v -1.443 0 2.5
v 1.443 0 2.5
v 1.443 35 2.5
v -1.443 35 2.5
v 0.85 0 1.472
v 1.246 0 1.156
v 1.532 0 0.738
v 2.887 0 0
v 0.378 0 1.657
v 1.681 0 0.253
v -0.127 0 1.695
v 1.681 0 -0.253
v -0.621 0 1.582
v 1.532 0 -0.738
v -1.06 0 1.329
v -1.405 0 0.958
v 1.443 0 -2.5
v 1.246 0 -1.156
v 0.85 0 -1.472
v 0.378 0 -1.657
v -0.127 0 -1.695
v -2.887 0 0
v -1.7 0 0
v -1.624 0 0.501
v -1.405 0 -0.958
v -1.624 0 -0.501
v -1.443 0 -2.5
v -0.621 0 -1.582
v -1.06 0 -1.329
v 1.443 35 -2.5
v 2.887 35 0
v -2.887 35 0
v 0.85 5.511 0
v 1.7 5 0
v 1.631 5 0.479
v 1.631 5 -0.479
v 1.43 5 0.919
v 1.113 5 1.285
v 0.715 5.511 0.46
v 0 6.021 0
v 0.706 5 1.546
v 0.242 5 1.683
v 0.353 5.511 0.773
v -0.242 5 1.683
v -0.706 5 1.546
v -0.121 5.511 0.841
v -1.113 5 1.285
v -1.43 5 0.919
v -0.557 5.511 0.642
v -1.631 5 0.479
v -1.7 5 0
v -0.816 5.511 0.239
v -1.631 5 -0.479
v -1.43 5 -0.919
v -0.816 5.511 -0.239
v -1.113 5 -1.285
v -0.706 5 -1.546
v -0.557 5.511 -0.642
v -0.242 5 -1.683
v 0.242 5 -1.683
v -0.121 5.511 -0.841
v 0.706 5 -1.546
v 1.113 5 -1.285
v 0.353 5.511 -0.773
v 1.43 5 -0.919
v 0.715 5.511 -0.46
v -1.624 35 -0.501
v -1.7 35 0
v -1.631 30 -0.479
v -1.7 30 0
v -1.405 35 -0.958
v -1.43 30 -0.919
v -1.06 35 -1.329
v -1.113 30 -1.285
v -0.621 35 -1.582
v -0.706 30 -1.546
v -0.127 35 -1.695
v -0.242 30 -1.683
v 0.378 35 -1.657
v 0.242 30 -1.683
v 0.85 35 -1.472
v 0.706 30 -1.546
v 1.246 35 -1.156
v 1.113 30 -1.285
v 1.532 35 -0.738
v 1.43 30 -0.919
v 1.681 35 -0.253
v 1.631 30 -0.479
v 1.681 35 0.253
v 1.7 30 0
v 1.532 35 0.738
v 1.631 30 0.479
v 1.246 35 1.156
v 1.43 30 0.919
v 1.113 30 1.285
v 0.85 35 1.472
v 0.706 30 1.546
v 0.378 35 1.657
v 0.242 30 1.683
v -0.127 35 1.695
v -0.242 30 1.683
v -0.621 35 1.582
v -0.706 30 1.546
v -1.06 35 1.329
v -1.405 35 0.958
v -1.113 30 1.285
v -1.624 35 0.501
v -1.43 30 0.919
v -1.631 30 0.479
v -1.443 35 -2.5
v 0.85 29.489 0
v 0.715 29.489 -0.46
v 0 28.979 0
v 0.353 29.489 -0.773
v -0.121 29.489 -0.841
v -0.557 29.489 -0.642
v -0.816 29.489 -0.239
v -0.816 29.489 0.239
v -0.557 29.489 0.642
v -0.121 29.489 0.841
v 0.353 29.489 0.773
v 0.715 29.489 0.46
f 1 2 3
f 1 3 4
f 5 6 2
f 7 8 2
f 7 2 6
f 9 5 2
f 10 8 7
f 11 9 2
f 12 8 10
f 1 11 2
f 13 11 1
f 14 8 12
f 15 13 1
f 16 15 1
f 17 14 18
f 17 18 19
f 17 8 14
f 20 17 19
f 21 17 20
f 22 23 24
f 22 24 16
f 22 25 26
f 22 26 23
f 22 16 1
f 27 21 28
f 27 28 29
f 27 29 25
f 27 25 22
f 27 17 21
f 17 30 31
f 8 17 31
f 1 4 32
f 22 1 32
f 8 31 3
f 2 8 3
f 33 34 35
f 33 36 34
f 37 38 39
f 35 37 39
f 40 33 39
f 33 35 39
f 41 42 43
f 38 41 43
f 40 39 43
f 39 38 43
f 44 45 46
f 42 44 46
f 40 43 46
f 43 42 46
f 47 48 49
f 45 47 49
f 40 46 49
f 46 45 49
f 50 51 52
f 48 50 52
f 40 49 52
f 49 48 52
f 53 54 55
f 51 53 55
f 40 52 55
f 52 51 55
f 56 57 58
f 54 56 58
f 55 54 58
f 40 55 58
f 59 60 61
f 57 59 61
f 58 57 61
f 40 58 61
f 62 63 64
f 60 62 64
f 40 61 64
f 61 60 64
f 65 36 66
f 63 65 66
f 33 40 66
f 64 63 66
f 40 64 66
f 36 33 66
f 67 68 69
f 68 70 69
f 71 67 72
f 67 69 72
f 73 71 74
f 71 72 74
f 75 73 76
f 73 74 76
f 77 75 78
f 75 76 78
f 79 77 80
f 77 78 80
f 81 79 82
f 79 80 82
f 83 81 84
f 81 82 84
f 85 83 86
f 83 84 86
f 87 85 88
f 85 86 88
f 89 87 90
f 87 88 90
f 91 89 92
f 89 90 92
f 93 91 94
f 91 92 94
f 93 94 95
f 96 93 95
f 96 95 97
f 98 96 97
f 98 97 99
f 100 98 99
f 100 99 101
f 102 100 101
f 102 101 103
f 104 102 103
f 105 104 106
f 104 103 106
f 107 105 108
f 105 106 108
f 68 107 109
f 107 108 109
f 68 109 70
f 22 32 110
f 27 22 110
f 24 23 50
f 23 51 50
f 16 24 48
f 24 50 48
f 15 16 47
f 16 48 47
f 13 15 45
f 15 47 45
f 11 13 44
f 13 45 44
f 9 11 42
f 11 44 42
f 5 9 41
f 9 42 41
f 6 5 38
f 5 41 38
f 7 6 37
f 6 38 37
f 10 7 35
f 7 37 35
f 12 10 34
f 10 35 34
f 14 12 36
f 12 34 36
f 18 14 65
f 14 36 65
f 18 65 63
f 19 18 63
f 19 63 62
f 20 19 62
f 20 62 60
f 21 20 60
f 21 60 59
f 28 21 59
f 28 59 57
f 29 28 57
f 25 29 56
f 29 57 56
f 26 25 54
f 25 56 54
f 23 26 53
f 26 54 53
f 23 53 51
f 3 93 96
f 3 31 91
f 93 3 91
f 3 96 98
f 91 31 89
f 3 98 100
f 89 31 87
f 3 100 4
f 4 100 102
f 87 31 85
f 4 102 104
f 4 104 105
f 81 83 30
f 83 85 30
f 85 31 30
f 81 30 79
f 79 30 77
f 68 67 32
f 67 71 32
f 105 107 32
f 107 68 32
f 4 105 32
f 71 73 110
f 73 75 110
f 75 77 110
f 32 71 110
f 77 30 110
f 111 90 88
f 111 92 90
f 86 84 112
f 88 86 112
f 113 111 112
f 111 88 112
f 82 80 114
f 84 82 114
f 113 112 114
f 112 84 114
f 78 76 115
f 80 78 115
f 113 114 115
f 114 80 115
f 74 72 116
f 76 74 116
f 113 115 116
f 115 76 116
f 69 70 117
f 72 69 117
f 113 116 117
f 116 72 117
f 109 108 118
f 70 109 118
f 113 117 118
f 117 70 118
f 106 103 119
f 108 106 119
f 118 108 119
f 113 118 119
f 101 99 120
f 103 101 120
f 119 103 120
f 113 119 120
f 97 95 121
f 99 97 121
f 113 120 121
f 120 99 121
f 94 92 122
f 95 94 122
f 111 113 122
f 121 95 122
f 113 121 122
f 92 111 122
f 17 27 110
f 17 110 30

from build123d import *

# Parameters (mm, degrees)
HEX_STANDOFF_DEPTH       = 35
M3_CLEARANCE_HOLE1_D     = 3.4
M3_CLEARANCE_HOLE1_DEPTH = 5
M3_CLEARANCE_HOLE1_TIP   = 1.021463052
M3_CLEARANCE_HOLE5_D     = 3.4
M3_CLEARANCE_HOLE5_DEPTH = 5
M3_CLEARANCE_HOLE5_TIP   = 1.021463052


with BuildPart() as part:
    # Sketch1 → Hex Standoff (new body)
    with BuildSketch(Plane(origin=(0, 0, 0), x_dir=(1, 0, 0), z_dir=(0, 1, 0))):
        Polygon((-1.443375673, 2.5), (1.443375673, 2.5), (2.886751346, 0), (1.443375673, -2.5), (-1.443375673, -2.5), (-2.886751346, 0), align=None)
    extrude(amount=HEX_STANDOFF_DEPTH)

    # M3 Clearance Hole1
    with Locations(Plane(origin=(0, 35, 0), x_dir=(1, 0, 0), z_dir=(0, 1, 0))):
        with Locations((0, 0)):
            Hole(M3_CLEARANCE_HOLE1_D / 2, depth=M3_CLEARANCE_HOLE1_DEPTH)
            with Locations((0, 0, -(M3_CLEARANCE_HOLE1_DEPTH + M3_CLEARANCE_HOLE1_TIP / 2))):  # 118° drill point
                Cone(0, M3_CLEARANCE_HOLE1_D / 2, M3_CLEARANCE_HOLE1_TIP, mode=Mode.SUBTRACT)

    # M3 Clearance Hole5
    with Locations(Plane.XZ):
        with Locations((0, 0)):
            Hole(M3_CLEARANCE_HOLE5_D / 2, depth=M3_CLEARANCE_HOLE5_DEPTH)
            with Locations((0, 0, -(M3_CLEARANCE_HOLE5_DEPTH + M3_CLEARANCE_HOLE5_TIP / 2))):  # 118° drill point
                Cone(0, M3_CLEARANCE_HOLE5_D / 2, M3_CLEARANCE_HOLE5_TIP, mode=Mode.SUBTRACT)


solid = part.part
